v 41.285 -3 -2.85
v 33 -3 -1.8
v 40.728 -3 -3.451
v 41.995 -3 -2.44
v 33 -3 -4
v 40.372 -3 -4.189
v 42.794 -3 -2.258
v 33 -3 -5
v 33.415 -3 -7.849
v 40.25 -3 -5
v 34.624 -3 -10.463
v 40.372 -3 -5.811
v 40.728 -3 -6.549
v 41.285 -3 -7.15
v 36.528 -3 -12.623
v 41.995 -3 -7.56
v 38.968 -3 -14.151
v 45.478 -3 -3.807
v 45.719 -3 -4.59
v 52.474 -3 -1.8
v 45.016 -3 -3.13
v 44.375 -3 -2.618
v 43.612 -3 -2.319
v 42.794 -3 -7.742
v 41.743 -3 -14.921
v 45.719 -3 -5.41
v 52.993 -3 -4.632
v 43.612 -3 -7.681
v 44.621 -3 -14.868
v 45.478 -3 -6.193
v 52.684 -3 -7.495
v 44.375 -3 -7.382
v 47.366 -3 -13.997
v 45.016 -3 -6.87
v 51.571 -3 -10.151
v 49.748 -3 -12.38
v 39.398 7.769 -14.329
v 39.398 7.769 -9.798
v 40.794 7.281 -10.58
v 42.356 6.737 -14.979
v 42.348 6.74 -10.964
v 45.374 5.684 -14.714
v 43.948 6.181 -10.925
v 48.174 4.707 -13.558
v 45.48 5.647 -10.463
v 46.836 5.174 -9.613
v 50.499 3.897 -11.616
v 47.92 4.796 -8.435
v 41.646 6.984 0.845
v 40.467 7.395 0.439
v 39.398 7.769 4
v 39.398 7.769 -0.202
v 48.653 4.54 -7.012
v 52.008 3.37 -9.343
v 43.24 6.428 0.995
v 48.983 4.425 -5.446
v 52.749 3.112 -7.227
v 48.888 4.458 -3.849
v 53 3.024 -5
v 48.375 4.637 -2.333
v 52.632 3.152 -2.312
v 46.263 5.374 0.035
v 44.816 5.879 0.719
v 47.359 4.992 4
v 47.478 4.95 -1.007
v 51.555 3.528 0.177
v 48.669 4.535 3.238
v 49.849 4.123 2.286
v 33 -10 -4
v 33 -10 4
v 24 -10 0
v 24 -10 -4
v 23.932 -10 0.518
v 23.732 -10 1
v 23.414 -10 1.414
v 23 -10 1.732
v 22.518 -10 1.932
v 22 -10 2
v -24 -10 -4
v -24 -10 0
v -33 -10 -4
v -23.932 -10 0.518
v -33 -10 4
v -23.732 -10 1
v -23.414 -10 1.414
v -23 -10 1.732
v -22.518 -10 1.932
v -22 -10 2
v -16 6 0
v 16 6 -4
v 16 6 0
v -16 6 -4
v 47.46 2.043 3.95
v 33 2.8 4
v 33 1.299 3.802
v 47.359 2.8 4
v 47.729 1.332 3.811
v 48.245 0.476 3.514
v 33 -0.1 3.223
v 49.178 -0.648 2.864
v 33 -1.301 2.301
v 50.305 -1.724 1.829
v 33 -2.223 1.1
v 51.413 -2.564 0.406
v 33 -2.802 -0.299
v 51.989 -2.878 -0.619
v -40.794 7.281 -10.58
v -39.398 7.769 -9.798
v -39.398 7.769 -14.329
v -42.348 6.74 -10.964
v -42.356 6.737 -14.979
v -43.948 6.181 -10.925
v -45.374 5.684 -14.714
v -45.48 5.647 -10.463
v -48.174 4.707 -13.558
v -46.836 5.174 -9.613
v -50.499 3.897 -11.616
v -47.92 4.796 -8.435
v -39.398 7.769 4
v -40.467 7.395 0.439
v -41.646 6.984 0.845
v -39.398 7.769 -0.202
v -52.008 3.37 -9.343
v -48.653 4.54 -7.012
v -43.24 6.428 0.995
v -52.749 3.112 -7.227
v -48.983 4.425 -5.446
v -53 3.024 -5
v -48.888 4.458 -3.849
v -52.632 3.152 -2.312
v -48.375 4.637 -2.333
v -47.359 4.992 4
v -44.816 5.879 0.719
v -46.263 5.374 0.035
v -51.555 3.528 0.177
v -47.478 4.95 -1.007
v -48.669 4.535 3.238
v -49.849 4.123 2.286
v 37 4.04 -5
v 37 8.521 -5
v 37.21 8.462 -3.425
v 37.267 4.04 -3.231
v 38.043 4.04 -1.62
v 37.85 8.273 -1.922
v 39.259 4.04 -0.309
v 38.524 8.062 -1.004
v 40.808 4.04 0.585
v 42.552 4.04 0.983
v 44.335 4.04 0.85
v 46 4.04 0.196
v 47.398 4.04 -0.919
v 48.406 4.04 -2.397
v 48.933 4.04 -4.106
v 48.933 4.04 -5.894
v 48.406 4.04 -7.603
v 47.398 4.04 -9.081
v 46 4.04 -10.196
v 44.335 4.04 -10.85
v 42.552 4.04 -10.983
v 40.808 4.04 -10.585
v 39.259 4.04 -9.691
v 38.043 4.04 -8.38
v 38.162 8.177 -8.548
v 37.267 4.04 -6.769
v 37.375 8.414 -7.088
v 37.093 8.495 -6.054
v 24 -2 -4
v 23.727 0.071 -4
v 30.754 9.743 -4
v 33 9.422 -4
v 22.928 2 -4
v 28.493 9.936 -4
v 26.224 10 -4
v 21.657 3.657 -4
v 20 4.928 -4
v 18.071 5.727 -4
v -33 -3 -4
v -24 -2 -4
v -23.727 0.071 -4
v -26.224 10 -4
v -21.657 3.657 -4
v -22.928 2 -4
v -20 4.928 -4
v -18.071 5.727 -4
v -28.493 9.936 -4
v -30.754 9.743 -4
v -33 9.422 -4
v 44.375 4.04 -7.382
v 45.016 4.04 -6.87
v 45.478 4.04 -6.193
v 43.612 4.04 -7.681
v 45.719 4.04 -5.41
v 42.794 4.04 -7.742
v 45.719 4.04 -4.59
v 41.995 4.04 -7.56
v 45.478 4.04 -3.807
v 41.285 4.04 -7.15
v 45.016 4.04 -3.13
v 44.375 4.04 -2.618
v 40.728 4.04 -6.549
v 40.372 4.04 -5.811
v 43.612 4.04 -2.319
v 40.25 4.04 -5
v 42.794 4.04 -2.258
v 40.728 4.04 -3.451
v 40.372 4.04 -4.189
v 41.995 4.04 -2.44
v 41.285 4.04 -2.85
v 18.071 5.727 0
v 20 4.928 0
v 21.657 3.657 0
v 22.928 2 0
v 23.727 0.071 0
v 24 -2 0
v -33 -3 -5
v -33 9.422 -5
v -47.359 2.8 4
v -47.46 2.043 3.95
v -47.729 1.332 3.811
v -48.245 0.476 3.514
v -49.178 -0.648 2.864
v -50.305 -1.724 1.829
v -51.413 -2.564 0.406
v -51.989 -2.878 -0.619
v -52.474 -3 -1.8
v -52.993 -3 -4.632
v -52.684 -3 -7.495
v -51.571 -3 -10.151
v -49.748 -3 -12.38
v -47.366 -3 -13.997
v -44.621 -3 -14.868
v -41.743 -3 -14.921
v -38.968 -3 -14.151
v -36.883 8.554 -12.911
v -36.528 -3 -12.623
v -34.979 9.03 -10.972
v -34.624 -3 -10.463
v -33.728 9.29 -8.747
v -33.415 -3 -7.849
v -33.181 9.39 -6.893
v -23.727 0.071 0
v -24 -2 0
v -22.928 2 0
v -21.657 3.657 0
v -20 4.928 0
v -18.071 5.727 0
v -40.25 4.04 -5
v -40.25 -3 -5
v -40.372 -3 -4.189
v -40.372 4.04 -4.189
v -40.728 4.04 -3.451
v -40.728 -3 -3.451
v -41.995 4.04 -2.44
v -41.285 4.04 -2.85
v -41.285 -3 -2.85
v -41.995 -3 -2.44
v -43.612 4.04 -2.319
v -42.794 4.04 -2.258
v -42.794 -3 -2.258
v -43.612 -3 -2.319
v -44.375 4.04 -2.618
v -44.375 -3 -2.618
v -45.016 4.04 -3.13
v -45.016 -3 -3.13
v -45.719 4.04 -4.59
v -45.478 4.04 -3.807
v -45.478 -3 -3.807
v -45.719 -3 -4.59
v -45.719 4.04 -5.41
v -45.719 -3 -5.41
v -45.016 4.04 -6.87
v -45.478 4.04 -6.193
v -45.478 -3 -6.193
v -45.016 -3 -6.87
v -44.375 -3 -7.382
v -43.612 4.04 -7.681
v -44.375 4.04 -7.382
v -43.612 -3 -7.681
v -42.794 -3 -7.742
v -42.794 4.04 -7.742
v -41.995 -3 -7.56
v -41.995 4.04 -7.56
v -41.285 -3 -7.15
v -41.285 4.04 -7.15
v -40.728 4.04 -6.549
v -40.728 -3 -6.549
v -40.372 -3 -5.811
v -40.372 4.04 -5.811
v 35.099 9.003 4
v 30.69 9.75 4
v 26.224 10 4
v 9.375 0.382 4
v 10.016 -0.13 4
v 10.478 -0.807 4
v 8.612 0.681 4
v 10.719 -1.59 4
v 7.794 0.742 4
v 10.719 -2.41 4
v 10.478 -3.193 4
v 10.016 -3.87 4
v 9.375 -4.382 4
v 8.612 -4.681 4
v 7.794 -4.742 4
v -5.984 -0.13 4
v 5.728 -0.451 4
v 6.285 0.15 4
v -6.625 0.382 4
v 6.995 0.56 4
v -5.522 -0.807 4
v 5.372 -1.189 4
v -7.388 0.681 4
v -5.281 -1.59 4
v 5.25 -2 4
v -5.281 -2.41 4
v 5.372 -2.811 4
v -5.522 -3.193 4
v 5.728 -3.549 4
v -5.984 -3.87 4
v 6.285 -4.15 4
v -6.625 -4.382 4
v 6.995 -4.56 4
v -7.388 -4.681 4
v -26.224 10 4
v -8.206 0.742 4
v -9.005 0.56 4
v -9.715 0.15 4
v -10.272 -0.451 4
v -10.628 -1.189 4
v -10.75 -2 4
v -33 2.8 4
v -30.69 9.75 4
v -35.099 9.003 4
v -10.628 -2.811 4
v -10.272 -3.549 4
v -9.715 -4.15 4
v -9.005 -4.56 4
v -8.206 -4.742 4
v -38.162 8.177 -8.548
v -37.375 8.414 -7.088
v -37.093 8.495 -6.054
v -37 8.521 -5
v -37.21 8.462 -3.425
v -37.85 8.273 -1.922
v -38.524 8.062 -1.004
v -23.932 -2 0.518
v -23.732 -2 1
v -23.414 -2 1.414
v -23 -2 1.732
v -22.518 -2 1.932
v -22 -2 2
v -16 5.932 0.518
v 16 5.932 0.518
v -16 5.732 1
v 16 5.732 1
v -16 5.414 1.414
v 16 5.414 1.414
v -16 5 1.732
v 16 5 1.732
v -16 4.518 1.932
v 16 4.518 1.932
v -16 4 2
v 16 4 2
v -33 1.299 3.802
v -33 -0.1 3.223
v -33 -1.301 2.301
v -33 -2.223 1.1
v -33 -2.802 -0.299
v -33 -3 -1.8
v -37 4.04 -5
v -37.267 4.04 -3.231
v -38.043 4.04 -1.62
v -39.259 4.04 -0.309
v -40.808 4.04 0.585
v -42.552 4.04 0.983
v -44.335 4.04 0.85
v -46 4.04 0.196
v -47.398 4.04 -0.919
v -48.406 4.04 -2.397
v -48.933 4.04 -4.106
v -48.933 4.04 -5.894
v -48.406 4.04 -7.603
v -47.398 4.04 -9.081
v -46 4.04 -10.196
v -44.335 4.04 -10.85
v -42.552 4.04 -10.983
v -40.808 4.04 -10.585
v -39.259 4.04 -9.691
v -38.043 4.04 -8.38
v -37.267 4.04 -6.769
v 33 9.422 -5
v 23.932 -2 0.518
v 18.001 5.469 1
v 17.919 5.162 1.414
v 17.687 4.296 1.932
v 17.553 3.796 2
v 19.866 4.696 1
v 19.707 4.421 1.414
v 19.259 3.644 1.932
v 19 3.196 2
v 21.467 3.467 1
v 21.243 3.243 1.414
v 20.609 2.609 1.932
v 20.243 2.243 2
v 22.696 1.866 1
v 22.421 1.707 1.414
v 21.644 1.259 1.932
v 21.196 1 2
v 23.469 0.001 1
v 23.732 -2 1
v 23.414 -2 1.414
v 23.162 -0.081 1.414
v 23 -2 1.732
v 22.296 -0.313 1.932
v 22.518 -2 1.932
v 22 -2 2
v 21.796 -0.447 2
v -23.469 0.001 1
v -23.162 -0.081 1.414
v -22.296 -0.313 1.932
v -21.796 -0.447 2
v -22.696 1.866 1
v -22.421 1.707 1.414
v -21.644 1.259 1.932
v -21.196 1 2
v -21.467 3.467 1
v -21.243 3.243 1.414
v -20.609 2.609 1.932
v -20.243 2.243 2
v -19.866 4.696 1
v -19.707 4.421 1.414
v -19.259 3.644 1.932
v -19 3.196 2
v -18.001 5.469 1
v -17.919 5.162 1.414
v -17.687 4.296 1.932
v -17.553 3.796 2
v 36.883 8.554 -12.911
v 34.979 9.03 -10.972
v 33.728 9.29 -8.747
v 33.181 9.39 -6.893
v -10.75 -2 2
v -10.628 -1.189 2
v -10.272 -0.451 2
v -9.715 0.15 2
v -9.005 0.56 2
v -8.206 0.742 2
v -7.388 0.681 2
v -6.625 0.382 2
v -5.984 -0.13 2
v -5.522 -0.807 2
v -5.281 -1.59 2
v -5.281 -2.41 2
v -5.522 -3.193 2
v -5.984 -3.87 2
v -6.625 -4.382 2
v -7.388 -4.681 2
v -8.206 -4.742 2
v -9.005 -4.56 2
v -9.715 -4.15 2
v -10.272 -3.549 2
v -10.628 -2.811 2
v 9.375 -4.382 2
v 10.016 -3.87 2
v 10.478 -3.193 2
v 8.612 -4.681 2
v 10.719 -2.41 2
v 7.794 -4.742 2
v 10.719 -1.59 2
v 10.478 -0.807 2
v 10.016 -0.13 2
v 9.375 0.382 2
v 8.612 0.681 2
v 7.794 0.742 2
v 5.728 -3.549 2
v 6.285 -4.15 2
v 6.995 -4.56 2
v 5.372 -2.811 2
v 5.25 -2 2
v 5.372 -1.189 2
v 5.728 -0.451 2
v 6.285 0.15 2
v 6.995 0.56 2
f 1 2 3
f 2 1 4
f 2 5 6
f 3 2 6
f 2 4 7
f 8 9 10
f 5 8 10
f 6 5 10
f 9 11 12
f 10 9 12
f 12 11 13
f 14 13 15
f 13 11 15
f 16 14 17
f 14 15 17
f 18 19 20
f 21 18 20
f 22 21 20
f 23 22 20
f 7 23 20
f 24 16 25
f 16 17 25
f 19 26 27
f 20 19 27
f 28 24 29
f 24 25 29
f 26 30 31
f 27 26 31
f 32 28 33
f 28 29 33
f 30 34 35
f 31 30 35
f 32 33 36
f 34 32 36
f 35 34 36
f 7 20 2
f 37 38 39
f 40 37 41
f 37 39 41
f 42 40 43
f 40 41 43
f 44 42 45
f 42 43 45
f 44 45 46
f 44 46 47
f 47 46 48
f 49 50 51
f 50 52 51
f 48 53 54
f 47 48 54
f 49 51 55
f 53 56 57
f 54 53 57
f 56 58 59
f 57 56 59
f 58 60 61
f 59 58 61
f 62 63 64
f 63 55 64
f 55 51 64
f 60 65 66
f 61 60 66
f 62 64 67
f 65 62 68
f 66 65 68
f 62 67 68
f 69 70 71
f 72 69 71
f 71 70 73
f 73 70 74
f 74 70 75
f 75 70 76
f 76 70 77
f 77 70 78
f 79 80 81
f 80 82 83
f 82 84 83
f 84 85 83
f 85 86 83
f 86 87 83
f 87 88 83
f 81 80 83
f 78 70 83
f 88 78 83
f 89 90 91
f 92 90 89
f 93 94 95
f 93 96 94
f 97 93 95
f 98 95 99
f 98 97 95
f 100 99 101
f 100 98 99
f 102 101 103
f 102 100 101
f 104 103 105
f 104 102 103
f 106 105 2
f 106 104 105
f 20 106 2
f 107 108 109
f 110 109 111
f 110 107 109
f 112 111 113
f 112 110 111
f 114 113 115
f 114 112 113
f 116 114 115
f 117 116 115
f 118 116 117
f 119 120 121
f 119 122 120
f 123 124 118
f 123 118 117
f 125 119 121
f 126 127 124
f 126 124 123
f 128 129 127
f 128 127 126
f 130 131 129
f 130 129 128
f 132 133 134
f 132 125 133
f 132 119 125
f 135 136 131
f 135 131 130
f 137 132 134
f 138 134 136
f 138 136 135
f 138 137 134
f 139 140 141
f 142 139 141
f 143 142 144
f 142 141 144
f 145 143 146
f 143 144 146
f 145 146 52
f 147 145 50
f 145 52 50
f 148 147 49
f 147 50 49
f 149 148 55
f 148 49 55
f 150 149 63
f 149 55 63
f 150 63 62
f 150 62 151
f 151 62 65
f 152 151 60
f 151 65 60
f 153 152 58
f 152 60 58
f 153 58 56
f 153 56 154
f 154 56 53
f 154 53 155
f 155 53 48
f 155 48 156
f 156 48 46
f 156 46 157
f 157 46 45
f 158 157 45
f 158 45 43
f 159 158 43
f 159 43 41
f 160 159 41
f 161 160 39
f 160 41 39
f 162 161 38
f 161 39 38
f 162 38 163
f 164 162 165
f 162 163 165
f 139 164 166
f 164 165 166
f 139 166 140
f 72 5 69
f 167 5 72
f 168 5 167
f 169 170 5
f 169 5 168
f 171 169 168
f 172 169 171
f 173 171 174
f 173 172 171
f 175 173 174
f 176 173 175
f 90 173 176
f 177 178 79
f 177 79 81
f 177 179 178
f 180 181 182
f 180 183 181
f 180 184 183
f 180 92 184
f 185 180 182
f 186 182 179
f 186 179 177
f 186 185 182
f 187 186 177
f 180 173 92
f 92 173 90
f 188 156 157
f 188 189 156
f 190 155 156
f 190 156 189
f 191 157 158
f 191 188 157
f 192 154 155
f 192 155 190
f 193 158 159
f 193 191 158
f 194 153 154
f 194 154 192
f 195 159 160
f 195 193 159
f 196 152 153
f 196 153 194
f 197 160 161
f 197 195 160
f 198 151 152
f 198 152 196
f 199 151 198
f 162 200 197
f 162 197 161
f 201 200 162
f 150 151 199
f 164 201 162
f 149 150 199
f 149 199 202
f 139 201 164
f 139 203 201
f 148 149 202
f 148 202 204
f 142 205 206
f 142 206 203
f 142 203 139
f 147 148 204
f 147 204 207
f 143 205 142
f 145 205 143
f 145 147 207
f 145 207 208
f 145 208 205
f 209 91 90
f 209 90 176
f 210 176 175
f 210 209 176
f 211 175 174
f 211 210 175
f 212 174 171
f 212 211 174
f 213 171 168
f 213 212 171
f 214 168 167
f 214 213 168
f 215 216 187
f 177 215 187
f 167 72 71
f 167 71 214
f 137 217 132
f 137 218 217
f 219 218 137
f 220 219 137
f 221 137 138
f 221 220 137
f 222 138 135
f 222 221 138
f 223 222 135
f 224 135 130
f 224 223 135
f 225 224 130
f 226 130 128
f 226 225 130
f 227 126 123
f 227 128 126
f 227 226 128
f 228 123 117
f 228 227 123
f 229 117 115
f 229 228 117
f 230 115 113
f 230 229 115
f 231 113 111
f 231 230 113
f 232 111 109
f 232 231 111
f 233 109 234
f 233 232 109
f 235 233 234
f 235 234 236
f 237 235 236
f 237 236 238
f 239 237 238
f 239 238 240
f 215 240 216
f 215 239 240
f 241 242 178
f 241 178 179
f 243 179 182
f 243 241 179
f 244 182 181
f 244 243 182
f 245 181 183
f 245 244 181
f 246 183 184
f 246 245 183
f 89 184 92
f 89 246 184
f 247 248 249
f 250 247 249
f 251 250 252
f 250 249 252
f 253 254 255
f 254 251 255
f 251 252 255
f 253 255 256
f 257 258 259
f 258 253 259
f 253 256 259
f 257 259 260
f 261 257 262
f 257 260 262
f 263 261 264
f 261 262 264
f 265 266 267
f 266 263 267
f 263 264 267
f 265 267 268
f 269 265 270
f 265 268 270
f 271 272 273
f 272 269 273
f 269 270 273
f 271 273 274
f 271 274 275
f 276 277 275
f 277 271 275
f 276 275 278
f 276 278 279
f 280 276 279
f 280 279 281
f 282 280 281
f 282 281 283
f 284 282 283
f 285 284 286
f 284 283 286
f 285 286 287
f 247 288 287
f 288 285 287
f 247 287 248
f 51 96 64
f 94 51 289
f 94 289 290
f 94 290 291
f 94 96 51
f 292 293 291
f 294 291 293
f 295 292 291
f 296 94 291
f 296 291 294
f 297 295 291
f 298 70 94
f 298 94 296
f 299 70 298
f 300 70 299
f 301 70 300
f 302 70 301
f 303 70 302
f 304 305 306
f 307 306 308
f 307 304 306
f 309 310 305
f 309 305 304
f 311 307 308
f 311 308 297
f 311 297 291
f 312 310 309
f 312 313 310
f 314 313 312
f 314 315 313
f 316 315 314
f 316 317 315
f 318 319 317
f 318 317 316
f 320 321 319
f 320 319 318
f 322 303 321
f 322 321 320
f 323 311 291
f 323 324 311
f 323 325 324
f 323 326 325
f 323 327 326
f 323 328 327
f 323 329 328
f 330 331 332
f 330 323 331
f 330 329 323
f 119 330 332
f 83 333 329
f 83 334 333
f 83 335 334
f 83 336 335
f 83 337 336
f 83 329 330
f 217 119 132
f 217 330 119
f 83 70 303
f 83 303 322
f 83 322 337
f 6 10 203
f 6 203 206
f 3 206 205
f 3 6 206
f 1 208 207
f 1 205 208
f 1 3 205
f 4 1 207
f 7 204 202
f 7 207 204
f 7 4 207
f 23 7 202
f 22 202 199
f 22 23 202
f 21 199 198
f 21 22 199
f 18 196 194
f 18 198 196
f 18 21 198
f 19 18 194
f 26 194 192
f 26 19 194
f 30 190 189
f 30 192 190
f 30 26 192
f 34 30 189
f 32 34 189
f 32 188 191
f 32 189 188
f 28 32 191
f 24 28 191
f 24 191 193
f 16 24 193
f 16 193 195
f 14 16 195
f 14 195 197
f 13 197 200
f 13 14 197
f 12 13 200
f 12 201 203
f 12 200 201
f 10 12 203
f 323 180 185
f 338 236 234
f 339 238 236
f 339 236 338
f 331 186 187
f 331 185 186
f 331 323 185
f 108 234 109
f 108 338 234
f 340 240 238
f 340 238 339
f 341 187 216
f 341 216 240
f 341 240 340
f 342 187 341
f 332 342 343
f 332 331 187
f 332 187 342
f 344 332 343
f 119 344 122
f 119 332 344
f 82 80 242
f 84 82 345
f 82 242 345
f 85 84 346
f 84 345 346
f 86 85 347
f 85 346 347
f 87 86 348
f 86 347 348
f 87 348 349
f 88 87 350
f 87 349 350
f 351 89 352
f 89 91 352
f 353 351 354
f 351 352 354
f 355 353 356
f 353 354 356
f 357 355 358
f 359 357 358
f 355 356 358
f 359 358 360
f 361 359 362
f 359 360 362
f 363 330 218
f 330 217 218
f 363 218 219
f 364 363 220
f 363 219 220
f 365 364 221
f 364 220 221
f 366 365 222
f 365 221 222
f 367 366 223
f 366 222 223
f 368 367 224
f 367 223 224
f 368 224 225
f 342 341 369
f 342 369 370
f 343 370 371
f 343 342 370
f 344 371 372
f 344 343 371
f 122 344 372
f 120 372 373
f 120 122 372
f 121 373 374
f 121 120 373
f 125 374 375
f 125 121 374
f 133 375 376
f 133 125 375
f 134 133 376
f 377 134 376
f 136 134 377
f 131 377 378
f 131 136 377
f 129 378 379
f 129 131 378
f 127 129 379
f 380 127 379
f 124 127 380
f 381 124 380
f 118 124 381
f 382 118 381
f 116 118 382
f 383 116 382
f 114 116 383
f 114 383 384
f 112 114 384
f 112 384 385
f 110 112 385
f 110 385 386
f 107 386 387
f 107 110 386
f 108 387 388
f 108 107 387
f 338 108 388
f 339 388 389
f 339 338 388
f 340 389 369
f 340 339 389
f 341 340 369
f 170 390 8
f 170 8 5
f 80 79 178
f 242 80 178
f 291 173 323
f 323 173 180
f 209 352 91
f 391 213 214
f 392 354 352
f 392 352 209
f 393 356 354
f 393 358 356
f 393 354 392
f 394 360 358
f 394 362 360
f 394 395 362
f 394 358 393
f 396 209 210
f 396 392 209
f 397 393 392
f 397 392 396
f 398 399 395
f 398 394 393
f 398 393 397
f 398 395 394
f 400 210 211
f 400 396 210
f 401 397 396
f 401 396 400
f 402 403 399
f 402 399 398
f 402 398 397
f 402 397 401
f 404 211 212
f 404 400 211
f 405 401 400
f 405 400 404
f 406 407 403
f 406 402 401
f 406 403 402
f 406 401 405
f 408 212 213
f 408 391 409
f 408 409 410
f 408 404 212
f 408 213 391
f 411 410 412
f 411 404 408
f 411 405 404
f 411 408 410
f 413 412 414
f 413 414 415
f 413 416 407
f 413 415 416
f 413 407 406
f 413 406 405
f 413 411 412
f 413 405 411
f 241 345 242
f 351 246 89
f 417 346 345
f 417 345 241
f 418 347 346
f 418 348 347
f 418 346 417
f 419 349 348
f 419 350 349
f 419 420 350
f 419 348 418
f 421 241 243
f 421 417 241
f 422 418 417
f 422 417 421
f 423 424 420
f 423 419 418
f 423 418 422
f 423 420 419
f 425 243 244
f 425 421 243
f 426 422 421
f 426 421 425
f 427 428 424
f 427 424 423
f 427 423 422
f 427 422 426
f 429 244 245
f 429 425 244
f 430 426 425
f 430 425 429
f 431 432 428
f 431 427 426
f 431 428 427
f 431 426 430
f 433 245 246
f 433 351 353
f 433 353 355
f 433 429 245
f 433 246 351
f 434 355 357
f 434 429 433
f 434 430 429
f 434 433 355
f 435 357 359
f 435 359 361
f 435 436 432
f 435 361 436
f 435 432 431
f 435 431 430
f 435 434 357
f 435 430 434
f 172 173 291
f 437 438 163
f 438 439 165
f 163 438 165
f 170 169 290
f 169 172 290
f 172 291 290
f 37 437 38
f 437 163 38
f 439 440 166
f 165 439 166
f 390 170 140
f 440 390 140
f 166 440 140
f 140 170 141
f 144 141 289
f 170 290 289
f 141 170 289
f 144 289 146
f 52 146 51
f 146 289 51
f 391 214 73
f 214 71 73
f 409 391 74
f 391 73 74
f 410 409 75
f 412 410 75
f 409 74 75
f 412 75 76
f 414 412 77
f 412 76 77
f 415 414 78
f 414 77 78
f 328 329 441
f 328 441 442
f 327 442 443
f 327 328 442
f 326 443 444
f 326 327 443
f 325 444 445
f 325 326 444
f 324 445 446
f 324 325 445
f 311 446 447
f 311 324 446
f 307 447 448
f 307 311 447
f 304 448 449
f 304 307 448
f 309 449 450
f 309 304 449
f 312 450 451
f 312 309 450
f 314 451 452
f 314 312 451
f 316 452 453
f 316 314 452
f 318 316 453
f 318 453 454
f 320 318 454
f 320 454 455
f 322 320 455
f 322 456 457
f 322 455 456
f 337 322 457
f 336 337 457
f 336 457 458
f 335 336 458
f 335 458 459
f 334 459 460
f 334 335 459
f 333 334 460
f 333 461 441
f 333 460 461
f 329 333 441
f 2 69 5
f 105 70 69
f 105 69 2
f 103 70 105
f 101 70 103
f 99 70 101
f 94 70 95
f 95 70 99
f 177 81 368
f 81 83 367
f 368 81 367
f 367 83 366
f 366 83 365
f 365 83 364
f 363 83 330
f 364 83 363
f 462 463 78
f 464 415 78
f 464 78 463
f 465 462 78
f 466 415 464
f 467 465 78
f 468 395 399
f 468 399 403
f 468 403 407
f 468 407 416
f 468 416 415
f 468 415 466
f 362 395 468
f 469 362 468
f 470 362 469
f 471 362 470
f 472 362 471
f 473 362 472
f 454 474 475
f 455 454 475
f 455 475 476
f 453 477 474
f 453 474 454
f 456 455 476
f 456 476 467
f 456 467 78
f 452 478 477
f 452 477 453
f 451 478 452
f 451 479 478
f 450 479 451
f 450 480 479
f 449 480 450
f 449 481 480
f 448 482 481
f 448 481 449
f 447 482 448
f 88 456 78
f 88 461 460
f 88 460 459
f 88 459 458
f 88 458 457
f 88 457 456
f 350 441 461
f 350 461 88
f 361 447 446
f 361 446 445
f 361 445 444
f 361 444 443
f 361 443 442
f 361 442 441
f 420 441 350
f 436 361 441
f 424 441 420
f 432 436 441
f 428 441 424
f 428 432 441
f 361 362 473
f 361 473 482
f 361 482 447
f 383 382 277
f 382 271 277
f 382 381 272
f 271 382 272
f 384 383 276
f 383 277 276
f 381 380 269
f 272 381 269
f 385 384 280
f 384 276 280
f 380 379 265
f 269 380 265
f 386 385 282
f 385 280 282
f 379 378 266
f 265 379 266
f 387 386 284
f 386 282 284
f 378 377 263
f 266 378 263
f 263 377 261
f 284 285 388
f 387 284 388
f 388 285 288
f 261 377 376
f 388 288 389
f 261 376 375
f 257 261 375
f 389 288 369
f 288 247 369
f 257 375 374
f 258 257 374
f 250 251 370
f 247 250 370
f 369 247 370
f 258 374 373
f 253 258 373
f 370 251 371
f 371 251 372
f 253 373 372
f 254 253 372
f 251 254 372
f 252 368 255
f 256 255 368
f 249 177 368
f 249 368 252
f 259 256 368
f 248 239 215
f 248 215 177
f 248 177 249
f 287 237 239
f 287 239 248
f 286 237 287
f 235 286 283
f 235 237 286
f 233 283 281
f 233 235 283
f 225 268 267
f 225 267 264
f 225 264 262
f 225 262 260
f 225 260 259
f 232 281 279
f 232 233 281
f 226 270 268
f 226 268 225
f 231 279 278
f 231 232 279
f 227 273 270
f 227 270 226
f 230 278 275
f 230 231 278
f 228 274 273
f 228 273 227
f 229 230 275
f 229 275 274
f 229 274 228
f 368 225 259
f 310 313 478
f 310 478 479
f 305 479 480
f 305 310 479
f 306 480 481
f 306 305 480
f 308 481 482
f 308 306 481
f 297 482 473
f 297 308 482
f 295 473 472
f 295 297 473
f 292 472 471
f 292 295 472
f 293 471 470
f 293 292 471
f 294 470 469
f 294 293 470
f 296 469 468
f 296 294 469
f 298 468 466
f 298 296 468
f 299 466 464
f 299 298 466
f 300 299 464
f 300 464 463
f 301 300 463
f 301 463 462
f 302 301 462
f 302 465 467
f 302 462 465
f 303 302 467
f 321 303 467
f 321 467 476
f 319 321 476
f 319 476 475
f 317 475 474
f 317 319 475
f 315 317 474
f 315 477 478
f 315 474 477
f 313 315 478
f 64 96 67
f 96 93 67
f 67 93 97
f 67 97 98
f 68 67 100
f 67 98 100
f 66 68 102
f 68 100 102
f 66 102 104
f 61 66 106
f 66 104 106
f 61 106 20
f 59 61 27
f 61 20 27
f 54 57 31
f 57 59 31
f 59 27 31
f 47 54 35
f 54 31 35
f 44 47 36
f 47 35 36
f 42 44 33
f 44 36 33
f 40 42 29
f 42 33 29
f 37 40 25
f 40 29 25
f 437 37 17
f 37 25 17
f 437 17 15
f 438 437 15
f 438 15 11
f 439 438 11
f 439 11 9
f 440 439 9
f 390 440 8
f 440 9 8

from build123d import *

# Parameters (mm, degrees)
SKETCH1_W               = 33
SKETCH1_H               = 20
BOSS_EXTRUDE1_DEPTH     = 4
BOSS_EXTRUDE2_START     = -13
BOSS_EXTRUDE2_DEPTH     = 13
FILLET2_R               = 5.8
CUT_EXTRUDE1_DEPTH      = 59.600341412
CUT_EXTRUDE1_DEPTH_BACK = 59.600341412
SKETCH3_R               = 2.75
CUT_EXTRUDE2_DEPTH      = 24.26
FILLET3_R               = 40
SKETCH5_R               = 6
CUT_EXTRUDE3_DEPTH      = 5.96
SKETCH7_W               = 48
SKETCH7_H               = 16
CUT_EXTRUDE6_DEPTH      = 6
FILLET4_R               = 8
FILLET5_R               = 2
CUT_EXTRUDE7_DEPTH      = 57.550862204
CUT_EXTRUDE7_DEPTH_BACK = 57.550862204
SKETCH8_R               = 2.75


with BuildPart() as part:
    # Sketch1 → Boss-Extrude1 (new, symmetric)
    with BuildSketch(Plane.XY):
        with Locations((16.5, 0)):
            Rectangle(SKETCH1_W, SKETCH1_H)
    extrude(amount=BOSS_EXTRUDE1_DEPTH, both=True)

    # Sketch2 → Boss-Extrude2 (add)
    with BuildSketch(Plane(origin=(0, 10, 0), x_dir=(1, 0, 0), z_dir=(0, 1, 0)).offset(BOSS_EXTRUDE2_START)):
        with BuildLine():
            Line((33, 5), (33, -4))
            Line((33, -4), (47.358898944, -4))
            ThreePointArc((47.358898944, -4), (48.310885546, 13.473163206), (33, 5))
        make_face()
    extrude(amount=BOSS_EXTRUDE2_DEPTH)

    # Fillet2
    fillet2_edges = [part.edges().sort_by_distance(p)[0] for p in [
        (40.179449472, -3, 4),
    ]]
    fillet(fillet2_edges, radius=FILLET2_R)

    # Sketch3 → Cut-Extrude1 (cut, two sides: drawn at the far end of the back side and taken through both)
    with BuildSketch(Plane(origin=(0, 10, 0), x_dir=(1, 0, 0), z_dir=(0, 1, 0)).offset(-CUT_EXTRUDE1_DEPTH_BACK)):
        with Locations(Location((43, 5, 0), (0, 0, 180))):
            Circle(SKETCH3_R)
    extrude(amount=CUT_EXTRUDE1_DEPTH + CUT_EXTRUDE1_DEPTH_BACK, mode=Mode.SUBTRACT)

    # Sketch4 → Cut-Extrude2 (cut)
    with BuildSketch(Plane.XY.offset(4)):
        Polygon((33, 10), (53, 3.02413209), (53, 10), align=None)
    extrude(amount=-CUT_EXTRUDE2_DEPTH, mode=Mode.SUBTRACT)

    # Fillet3
    # the kernel refuses this fillet: 40 mm, written as the material it takes off along each edge
    with BuildSketch(Plane(origin=(33, 10, 20.939258542), x_dir=(0.9442130463798117, -0.32933527452454203, 0), z_dir=(0, 0, -1))) as fillet3_piece_1:
        with BuildLine():
            CenterArc((FILLET3_R * 0.169392585415, FILLET3_R), FILLET3_R, 250.771565663, 19.228434337)
            Line((-FILLET3_R * 0.159942689109, FILLET3_R * 0.0557869536202), (0, 0))
            Line((0, 0), (FILLET3_R * 0.169392585415, 0))
        make_face()
    extrude(amount=41.878517083, mode=Mode.SUBTRACT)

    # Sketch5 → Cut-Extrude3 (cut)
    with BuildSketch(Plane(origin=(0, 10, 0), x_dir=(1, 0, 0), z_dir=(0, 1, 0))):
        with Locations(Location((43, 5, 0), (0, 0, 180))):
            Circle(SKETCH5_R)
    extrude(amount=-CUT_EXTRUDE3_DEPTH, mode=Mode.SUBTRACT)

    # Mirror2: part across plane


with BuildPart() as part_1:
    add(part.part)
    add(part.part.mirror(Plane(origin=(0, 10, 4), x_dir=(0, 0, 1), z_dir=(1, 0, 0))))

    # Sketch7 → Cut-Extrude6 (cut)
    with BuildSketch(Plane(origin=(0, 0, -4), x_dir=(-1, 0, 0), z_dir=(0, 0, -1))):
        with Locations((0, -2)):
            Rectangle(SKETCH7_W, SKETCH7_H)
    extrude(amount=-CUT_EXTRUDE6_DEPTH, mode=Mode.SUBTRACT)

    # Fillet4
    fillet4_edges = [part_1.edges().sort_by_distance(p)[0] for p in [
        (-24, 6, -1),
        (24, 6, -1),
    ]]
    fillet(fillet4_edges, radius=FILLET4_R)

    # Fillet5
    fillet5_edges = [part_1.edges().sort_by_distance(p)[0] for p in [
        (-24, -6, 2),
        (0, 6, 2),
        (24, -6, 2),
        (21.656854249, 3.656854249, 2),
        (-21.656854249, 3.656854249, 2),
    ]]
    fillet(fillet5_edges, radius=FILLET5_R)

    # Sketch8 → Cut-Extrude7 (cut, two sides: drawn at the far end of the back side and taken through both)
    with BuildSketch(Plane(origin=(0, 0, 2), x_dir=(-1, 0, 0), z_dir=(0, 0, -1)).offset(-CUT_EXTRUDE7_DEPTH_BACK)):
        with Locations((-8, -2)):
            Circle(SKETCH8_R)
        with Locations((8, -2)):
            Circle(SKETCH8_R)
    extrude(amount=CUT_EXTRUDE7_DEPTH + CUT_EXTRUDE7_DEPTH_BACK, mode=Mode.SUBTRACT)


solid = part_1.part
